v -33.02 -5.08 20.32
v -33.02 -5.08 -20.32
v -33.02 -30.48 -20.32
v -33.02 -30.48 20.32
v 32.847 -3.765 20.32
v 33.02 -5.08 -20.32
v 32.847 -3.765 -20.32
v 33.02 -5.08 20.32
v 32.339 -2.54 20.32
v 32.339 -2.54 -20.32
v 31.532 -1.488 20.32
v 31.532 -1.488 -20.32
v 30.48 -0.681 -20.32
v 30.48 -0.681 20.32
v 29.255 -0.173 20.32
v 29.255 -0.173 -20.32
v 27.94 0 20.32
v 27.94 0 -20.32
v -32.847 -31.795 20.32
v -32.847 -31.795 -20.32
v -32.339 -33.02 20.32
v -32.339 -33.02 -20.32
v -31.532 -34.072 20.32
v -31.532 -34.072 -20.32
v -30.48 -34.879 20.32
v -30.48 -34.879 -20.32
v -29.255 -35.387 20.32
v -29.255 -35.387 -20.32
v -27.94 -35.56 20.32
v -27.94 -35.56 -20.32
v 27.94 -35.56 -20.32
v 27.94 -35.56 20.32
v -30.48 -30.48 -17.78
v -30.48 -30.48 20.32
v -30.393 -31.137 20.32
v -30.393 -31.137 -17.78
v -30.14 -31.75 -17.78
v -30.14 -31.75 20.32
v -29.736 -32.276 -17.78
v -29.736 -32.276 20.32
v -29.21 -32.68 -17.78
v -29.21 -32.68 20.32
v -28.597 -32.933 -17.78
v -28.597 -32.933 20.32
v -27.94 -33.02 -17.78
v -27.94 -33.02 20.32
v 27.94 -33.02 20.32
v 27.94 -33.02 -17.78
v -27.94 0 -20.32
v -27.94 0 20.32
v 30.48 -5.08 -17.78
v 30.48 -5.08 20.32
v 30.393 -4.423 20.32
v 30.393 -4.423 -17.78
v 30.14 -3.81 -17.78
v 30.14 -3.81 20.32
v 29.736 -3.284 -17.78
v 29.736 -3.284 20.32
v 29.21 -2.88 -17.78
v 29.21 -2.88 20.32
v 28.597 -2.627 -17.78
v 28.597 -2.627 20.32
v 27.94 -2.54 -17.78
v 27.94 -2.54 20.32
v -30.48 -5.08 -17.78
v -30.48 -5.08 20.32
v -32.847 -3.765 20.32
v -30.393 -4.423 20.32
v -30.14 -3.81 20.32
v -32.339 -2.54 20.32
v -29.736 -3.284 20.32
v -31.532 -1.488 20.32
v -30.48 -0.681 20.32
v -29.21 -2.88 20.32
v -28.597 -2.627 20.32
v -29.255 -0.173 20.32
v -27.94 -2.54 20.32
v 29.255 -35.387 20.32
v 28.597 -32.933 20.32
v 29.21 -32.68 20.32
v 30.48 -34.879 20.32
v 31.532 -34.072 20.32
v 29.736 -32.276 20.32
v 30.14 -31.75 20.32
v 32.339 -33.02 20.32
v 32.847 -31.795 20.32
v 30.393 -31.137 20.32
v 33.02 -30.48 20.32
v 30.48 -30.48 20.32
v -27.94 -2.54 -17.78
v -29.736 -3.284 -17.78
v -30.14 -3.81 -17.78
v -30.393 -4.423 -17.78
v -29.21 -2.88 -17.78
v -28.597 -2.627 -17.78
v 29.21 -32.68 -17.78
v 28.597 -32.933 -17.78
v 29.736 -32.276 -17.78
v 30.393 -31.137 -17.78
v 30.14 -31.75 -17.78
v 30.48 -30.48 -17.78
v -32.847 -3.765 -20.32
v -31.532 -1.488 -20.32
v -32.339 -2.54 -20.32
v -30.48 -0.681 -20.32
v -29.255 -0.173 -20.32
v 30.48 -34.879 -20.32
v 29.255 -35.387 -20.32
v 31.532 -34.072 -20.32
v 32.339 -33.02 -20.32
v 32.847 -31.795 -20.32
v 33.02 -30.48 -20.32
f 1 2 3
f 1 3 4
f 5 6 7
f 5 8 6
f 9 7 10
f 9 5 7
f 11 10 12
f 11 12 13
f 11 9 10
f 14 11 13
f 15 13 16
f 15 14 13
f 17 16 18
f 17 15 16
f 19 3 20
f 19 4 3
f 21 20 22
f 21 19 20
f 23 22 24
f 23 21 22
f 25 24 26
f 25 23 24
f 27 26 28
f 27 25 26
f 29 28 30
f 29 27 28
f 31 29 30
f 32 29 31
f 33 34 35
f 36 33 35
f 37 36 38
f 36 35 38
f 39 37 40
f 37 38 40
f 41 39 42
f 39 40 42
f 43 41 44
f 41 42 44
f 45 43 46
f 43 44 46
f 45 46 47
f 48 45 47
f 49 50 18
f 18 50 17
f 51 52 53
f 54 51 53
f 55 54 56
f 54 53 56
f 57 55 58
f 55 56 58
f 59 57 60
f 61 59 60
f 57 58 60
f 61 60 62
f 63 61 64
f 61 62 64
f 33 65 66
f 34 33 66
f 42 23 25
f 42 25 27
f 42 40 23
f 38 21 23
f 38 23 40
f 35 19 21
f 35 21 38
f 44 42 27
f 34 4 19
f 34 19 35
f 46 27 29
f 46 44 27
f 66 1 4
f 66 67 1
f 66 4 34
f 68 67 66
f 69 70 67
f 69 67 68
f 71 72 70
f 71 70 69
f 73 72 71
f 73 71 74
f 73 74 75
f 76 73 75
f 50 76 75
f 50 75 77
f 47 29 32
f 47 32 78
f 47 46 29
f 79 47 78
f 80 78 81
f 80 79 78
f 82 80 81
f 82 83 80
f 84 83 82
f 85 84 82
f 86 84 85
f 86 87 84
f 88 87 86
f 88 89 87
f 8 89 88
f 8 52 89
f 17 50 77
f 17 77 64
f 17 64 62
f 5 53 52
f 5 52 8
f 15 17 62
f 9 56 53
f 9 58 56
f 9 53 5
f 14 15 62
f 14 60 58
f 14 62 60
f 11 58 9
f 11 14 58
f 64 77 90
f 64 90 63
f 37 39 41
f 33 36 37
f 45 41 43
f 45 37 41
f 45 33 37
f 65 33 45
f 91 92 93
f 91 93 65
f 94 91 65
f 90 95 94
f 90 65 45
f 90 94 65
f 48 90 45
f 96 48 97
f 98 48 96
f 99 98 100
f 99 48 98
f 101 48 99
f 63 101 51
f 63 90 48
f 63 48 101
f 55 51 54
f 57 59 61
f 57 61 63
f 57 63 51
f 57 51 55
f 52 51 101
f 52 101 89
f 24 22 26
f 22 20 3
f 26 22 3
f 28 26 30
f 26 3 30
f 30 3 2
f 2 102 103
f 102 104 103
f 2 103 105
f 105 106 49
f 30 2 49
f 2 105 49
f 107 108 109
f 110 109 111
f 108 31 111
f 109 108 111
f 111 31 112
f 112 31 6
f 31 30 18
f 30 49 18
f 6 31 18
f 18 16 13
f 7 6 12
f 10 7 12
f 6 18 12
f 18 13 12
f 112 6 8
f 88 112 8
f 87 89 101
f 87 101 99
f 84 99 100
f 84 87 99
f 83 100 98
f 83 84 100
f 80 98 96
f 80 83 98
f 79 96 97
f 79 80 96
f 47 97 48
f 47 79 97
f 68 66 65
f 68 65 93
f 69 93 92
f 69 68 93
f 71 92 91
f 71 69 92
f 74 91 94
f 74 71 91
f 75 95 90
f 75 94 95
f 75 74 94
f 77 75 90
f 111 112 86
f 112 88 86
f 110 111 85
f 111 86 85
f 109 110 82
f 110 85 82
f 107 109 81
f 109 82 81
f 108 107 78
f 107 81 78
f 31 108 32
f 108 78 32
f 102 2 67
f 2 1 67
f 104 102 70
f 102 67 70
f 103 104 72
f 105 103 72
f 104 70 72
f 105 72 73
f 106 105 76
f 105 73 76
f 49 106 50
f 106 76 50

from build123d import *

# Parameters (mm, degrees)
F0_W     = 66.04
F0_H     = 40.64
F1_DEPTH = 35.56
F2_R     = 5.08
F3_T     = -2.54


with BuildPart() as f1:
    # F0 (on Front) → F1 (new body)
    with BuildSketch(Plane.XZ):
        Rectangle(F0_W, F0_H)
    extrude(amount=F1_DEPTH)

    # F2
    f2_edges = [f1.edges().sort_by_distance(p)[0] for p in [
        (33.02, -35.56, 0),
        (33.02, 0, 0),
        (-33.02, -35.56, 0),
        (-33.02, 0, 0),
    ]]
    fillet(f2_edges, radius=F2_R)

    # F3
    f3_openings = [f1.faces().sort_by_distance(p)[0] for p in [
        (0, -17.78, 20.32),
    ]]
    offset(amount=F3_T, openings=f3_openings)


solid = f1.part
